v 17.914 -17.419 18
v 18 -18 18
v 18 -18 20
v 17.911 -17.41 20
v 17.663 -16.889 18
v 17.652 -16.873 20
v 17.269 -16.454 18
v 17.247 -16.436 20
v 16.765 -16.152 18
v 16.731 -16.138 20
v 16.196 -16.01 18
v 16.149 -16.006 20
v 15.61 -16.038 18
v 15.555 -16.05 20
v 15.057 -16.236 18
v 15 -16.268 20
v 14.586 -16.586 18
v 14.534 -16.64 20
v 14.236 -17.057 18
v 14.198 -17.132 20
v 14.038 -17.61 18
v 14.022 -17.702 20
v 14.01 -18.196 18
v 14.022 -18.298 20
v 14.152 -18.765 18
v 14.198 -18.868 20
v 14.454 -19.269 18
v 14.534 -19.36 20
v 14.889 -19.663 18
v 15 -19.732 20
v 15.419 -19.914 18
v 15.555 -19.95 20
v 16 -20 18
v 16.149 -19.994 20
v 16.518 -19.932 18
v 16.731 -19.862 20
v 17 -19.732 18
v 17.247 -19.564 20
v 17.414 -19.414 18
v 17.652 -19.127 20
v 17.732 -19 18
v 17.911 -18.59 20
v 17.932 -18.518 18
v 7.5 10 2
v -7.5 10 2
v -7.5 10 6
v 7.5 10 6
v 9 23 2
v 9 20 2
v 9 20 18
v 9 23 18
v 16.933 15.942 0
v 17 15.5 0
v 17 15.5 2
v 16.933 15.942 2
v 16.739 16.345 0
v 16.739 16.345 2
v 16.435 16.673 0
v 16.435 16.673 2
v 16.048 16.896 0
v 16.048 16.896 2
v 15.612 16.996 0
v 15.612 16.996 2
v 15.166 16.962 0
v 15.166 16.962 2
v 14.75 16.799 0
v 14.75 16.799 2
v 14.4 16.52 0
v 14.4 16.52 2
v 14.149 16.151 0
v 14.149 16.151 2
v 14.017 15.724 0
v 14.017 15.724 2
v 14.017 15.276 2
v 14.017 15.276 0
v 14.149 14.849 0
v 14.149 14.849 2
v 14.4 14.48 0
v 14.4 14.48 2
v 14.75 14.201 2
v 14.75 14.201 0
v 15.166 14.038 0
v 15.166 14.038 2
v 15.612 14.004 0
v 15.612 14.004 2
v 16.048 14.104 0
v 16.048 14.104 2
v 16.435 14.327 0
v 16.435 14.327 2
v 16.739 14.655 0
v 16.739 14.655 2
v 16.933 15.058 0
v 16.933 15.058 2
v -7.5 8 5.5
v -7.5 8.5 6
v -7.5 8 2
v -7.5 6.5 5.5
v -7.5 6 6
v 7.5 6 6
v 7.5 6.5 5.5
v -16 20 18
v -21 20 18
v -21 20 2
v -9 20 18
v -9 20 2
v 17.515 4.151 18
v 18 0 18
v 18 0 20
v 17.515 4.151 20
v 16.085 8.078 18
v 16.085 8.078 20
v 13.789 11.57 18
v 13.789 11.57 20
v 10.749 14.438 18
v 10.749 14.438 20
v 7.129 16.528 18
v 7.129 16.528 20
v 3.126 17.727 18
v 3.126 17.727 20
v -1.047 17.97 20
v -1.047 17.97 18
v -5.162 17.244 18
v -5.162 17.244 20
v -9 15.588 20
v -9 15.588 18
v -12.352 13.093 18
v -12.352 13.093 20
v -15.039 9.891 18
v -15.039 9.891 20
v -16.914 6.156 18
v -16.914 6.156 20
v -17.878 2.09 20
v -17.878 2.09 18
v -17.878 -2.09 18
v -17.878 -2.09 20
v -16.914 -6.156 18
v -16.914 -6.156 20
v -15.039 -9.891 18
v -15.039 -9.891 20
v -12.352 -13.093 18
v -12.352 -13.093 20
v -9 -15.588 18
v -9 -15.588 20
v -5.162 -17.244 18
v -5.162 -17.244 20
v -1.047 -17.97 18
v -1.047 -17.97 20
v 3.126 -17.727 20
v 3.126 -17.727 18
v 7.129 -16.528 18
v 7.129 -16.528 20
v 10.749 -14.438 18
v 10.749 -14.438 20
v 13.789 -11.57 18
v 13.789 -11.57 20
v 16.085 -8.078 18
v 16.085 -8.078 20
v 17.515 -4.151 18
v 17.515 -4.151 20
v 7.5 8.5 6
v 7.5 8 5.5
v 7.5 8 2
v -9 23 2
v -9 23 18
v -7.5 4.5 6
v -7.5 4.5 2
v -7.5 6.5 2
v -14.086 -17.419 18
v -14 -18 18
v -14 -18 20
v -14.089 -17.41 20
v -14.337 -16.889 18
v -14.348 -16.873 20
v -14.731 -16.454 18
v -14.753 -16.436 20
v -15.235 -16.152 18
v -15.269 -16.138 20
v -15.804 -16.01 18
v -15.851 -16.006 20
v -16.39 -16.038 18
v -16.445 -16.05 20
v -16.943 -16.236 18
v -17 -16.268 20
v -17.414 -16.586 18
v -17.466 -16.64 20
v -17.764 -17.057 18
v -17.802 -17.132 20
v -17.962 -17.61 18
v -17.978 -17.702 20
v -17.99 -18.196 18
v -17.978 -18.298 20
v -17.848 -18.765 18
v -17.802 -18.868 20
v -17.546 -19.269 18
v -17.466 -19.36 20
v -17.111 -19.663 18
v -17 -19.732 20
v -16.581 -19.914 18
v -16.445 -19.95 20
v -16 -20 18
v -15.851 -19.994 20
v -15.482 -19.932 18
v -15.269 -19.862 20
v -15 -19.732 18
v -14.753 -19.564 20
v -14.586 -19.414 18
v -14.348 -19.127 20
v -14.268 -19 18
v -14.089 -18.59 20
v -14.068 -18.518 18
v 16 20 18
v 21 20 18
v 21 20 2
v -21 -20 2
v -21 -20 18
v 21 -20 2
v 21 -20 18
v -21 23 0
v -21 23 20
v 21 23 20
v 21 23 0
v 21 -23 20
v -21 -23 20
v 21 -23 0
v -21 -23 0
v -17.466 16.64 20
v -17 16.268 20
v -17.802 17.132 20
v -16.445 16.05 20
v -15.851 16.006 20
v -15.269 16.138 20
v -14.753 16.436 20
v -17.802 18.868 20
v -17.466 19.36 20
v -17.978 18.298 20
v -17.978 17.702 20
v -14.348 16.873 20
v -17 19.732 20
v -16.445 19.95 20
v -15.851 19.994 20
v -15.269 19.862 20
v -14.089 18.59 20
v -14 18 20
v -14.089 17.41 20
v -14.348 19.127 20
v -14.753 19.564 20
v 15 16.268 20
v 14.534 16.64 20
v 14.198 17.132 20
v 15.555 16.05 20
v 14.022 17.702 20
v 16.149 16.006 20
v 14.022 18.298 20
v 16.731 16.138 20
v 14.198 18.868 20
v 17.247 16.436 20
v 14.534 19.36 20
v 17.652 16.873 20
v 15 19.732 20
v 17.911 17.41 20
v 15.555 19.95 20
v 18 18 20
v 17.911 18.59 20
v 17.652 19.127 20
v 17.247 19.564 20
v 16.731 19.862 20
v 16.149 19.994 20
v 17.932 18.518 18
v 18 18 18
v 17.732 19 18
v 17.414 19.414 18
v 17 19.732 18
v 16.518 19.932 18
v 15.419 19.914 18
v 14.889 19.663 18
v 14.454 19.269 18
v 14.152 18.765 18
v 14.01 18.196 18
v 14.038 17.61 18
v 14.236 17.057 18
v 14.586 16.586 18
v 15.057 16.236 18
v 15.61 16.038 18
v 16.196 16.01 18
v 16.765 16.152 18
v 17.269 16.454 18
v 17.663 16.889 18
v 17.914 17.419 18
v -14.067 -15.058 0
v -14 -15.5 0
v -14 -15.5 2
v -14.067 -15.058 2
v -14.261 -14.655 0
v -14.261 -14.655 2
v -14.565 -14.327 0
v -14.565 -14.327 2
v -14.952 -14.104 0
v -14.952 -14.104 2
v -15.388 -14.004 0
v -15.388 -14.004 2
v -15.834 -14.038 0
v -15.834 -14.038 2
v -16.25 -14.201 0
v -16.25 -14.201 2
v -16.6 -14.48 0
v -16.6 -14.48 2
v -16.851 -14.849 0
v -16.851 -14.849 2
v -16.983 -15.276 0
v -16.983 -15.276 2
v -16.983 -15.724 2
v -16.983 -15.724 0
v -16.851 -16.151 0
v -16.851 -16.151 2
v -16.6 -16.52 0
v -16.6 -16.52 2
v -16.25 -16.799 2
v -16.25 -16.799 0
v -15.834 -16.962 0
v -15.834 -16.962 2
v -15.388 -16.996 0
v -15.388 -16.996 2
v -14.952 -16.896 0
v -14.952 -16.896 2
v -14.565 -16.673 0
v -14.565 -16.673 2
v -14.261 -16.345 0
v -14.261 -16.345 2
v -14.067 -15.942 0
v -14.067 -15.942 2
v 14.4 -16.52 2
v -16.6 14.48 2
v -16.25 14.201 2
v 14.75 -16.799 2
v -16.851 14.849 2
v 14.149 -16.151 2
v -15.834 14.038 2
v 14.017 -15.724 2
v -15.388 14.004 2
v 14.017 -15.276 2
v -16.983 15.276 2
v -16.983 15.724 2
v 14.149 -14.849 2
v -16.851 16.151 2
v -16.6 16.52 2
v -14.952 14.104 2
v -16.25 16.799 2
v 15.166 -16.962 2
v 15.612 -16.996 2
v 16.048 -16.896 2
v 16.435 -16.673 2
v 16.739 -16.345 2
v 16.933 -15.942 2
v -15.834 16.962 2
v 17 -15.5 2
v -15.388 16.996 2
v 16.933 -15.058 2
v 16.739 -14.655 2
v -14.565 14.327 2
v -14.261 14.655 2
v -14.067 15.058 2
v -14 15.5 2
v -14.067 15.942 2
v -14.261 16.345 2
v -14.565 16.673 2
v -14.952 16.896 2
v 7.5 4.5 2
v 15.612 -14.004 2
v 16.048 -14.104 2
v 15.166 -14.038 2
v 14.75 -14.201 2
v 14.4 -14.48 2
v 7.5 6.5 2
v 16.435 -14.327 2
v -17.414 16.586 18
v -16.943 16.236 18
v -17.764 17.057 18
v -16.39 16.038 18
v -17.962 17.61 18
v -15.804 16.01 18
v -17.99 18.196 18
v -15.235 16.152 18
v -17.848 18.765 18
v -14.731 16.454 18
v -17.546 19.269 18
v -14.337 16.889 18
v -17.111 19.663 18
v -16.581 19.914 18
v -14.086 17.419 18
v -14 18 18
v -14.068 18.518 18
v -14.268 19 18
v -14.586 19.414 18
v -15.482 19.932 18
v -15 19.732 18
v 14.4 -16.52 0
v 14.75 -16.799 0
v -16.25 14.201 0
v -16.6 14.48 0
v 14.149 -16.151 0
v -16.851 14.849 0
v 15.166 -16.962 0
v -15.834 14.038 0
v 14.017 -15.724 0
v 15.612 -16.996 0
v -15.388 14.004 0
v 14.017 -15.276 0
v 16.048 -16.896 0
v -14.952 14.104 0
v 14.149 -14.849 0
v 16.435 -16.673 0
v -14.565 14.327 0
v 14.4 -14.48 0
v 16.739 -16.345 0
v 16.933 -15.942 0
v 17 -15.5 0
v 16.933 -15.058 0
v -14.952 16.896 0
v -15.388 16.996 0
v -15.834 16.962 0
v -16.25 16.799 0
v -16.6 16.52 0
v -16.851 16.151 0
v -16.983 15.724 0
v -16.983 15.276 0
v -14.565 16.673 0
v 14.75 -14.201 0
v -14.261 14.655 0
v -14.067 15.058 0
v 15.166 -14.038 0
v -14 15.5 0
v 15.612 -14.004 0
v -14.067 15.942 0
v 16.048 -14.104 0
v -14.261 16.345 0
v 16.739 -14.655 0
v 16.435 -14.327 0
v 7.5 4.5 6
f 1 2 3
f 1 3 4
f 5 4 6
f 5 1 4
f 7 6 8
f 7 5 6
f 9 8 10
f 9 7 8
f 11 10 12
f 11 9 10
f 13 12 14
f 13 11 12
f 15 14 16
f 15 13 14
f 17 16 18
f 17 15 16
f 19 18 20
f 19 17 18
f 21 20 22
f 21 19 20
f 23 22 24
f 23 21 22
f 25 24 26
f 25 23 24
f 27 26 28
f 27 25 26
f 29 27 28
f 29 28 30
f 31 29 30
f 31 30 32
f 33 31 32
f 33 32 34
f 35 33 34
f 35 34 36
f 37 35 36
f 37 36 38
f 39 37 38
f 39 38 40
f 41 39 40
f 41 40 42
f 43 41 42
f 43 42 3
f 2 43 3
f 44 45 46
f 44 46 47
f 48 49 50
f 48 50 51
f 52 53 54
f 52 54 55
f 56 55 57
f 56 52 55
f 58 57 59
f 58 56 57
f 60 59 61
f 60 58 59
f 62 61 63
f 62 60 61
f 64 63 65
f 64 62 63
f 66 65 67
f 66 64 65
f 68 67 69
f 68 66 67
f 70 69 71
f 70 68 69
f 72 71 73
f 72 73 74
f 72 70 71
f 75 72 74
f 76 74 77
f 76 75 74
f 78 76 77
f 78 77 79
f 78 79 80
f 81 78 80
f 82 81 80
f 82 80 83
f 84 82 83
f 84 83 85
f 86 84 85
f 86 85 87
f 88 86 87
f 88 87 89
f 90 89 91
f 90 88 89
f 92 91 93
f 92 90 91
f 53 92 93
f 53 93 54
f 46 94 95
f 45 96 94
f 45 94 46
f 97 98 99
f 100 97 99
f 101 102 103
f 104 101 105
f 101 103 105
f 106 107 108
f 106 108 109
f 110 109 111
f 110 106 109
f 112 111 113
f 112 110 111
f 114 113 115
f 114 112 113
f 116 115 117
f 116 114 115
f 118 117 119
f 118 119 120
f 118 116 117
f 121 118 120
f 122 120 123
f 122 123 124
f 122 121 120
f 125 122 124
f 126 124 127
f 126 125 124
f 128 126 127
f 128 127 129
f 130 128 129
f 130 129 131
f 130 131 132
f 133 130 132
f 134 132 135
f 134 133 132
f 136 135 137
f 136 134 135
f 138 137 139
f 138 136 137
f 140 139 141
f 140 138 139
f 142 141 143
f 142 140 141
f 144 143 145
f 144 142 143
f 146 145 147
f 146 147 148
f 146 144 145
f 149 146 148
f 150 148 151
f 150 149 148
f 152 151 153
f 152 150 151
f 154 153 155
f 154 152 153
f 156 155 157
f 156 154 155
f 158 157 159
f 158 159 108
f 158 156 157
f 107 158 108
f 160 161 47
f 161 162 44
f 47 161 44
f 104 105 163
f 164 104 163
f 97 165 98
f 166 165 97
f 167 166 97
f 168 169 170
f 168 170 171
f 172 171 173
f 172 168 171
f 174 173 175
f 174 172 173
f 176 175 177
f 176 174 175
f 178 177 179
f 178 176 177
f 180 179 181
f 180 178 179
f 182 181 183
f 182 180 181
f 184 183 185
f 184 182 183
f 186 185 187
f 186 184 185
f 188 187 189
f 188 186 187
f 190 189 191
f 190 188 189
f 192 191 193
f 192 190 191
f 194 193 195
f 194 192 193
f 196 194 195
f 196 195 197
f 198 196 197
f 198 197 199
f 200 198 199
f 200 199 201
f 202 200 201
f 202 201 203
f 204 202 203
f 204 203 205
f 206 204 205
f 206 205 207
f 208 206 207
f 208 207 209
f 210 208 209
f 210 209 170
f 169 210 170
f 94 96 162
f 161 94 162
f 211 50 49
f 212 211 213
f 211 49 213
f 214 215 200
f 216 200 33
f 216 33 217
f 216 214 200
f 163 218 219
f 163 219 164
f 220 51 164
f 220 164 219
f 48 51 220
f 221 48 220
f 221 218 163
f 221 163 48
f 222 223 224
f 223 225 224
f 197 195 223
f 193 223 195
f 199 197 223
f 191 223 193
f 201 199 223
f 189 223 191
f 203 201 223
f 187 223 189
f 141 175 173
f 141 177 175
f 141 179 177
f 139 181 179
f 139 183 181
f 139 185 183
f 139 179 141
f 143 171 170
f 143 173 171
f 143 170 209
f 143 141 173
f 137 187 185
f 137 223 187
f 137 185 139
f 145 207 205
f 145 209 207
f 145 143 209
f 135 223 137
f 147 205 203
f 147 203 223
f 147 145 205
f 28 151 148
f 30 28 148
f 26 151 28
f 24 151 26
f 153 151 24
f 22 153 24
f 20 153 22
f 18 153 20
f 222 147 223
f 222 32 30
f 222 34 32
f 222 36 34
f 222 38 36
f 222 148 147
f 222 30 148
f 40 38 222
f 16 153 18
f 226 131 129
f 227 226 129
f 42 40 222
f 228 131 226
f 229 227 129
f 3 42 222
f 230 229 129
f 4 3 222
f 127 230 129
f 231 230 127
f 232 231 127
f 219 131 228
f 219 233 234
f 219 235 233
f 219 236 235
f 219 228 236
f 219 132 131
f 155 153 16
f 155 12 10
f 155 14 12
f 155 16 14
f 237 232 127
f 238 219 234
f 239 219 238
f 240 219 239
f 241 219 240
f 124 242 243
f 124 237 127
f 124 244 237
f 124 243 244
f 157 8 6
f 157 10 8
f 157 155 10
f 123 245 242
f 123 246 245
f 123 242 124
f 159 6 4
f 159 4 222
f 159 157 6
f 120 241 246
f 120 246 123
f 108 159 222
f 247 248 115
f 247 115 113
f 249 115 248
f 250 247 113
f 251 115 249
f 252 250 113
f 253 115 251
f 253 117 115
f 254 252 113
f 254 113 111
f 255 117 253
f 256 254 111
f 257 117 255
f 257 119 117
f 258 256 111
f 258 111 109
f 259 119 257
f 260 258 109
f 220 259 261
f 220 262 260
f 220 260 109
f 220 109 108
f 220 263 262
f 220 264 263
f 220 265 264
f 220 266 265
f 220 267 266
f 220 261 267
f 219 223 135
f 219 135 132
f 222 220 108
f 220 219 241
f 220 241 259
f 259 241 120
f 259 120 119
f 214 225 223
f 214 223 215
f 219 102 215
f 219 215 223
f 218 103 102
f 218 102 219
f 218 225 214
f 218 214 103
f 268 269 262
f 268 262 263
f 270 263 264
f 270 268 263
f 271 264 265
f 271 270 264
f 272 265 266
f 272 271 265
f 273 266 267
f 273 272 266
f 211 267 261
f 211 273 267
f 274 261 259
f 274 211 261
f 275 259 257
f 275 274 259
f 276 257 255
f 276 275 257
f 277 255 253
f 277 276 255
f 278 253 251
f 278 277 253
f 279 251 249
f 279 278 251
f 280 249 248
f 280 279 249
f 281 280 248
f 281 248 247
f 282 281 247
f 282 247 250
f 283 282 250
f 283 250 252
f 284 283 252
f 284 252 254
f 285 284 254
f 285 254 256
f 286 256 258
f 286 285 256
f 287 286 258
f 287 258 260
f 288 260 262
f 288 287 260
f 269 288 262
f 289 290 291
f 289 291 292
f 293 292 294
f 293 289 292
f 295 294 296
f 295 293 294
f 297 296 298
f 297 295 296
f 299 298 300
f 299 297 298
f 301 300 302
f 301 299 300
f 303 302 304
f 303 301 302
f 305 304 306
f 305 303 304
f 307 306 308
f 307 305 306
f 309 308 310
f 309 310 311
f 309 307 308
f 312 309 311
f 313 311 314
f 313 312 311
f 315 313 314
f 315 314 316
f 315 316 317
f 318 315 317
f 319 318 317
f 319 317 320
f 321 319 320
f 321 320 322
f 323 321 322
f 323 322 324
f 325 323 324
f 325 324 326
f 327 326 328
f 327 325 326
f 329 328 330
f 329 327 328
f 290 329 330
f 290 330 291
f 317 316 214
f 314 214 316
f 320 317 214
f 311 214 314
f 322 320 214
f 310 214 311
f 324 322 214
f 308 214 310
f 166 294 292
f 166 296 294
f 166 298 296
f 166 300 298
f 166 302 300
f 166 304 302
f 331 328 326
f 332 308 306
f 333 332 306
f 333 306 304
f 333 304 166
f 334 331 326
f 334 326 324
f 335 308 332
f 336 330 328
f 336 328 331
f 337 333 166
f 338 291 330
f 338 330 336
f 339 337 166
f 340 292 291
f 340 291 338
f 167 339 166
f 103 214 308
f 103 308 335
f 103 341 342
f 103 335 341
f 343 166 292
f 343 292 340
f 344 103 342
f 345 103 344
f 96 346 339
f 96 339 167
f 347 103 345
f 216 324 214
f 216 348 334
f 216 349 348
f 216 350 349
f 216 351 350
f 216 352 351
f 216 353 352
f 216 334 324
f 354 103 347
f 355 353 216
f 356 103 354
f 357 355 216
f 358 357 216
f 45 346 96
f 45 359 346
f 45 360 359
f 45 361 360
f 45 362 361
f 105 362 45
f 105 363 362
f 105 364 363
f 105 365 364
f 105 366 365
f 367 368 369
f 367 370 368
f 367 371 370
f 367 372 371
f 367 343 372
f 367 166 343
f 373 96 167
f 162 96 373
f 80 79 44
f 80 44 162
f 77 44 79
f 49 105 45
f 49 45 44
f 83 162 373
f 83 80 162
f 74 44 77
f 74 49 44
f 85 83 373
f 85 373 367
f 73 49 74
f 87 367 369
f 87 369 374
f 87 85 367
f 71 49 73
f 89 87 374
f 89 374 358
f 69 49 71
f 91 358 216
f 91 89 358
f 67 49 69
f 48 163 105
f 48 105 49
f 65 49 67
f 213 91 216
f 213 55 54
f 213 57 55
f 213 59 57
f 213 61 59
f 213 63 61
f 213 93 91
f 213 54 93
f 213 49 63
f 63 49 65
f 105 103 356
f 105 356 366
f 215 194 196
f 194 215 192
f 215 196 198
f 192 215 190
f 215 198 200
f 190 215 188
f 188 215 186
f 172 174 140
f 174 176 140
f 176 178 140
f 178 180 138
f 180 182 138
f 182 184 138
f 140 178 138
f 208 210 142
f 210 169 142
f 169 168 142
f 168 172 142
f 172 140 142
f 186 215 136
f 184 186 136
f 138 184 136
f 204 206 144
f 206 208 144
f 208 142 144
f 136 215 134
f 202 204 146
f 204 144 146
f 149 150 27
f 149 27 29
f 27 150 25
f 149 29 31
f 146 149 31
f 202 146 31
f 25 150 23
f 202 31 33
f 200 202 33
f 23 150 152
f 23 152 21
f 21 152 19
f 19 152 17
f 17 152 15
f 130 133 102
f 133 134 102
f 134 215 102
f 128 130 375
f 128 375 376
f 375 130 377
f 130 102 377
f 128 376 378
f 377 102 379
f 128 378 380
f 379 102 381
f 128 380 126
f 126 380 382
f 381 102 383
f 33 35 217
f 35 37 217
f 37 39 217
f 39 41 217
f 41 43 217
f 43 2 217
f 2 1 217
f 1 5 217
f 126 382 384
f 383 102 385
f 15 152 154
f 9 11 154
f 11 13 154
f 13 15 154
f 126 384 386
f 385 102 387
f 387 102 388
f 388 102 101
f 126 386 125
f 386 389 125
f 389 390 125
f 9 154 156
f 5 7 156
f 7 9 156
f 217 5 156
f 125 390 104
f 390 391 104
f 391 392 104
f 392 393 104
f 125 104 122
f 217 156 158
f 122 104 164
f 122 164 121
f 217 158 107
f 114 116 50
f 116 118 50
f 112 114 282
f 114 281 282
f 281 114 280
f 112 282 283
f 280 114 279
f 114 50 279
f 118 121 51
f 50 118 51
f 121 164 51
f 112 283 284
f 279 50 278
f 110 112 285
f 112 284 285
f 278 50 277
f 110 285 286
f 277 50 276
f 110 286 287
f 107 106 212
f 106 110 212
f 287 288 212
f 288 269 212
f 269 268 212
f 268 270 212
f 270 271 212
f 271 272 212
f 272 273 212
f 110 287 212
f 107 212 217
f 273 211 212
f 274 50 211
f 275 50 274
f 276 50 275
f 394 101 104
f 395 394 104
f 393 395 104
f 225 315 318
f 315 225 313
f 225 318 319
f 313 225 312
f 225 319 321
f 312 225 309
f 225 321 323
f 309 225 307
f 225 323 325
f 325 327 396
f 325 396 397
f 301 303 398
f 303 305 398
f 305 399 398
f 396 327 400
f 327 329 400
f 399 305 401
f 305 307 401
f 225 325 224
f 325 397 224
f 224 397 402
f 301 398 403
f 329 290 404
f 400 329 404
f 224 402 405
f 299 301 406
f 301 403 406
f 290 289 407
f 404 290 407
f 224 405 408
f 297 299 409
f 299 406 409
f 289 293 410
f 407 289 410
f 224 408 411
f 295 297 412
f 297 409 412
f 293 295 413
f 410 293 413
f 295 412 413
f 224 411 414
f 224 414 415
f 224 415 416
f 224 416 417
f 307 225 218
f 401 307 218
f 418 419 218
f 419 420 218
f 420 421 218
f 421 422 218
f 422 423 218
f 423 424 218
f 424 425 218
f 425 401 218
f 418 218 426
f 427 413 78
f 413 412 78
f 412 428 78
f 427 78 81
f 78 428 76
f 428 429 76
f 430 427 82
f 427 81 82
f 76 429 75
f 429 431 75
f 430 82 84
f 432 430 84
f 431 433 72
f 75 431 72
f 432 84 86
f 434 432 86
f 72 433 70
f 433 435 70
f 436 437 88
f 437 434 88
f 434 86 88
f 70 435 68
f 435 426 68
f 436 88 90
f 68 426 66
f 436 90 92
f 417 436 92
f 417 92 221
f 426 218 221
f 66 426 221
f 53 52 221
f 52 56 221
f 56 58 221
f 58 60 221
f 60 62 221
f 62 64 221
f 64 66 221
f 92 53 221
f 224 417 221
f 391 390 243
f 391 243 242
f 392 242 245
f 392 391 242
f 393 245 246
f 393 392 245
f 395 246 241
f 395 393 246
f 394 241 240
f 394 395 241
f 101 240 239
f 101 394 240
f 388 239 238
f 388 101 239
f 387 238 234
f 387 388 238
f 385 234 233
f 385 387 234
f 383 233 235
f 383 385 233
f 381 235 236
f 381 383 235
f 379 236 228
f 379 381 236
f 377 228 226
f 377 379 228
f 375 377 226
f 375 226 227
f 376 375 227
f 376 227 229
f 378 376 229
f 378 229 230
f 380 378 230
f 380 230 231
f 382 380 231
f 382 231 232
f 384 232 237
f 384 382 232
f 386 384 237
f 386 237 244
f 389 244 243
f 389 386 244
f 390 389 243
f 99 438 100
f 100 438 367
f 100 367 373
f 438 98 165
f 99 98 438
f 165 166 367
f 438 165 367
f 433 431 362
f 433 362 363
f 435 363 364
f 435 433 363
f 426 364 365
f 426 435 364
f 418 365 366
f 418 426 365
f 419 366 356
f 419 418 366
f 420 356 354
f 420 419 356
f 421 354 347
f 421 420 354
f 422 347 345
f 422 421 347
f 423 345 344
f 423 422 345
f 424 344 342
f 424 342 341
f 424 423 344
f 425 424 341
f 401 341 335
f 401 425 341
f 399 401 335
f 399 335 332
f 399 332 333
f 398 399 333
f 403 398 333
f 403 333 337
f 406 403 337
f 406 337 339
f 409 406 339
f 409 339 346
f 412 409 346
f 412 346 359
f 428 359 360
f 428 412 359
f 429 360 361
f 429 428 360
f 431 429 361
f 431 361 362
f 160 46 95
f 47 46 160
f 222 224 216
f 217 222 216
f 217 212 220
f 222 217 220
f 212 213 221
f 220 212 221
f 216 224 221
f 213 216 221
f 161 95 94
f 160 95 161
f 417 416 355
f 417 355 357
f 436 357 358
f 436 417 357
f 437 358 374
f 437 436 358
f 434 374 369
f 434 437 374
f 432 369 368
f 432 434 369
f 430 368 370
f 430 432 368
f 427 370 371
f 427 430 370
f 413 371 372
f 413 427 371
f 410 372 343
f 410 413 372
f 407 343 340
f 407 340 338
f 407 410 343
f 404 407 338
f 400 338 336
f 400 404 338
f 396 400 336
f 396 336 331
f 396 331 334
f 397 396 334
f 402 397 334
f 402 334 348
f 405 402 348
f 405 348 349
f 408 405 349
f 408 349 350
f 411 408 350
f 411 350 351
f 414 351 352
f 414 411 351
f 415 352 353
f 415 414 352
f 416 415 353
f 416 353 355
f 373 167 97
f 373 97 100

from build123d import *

# Parameters (mm, degrees)
F0_W     = 42
F0_H     = 46
F0_R     = 1.5
F1_DEPTH = 2
F2_W     = 12
F2_H     = 3
F2_W_2   = 42
F3_DEPTH = 16
F4_W     = 42
F4_H     = 46
F4_R     = 2
F4_R_2   = 18
F5_DEPTH = 2
F6_W     = 15
F6_H     = 2
F7_DEPTH = 4
F8_SIZE  = 0.5


with BuildPart() as f1:
    # F0 (on Top) → F1 (new body)
    with BuildSketch(Plane.XY):
        Rectangle(F0_W, F0_H)
        with Locations((-15.5, -15.5)):
            Circle(F0_R, mode=Mode.SUBTRACT)
        with Locations((15.5, -15.5)):
            Circle(F0_R, mode=Mode.SUBTRACT)
        with Locations((-15.5, 15.5)):
            Circle(F0_R, mode=Mode.SUBTRACT)
        with Locations((15.5, 15.5)):
            Circle(F0_R, mode=Mode.SUBTRACT)
    extrude(amount=F1_DEPTH)

    # F2 (on face) → F3 (join)
    with BuildSketch(Plane.XY.offset(2)):
        with Locations((15, 21.5)):
            Rectangle(F2_W, F2_H)
        with Locations((-15, 21.5)):
            Rectangle(F2_W, F2_H)
        with Locations((0, -21.5)):
            Rectangle(F2_W_2, F2_H)
    extrude(amount=F3_DEPTH)

    # F4 (on face) → F5 (join)
    with BuildSketch(Plane.XY.offset(18)):
        Rectangle(F4_W, F4_H)
        with Locations((-16, -18)):
            Circle(F4_R, mode=Mode.SUBTRACT)
        with Locations((16, -18)):
            Circle(F4_R, mode=Mode.SUBTRACT)
        with Locations((-16, 18)):
            Circle(F4_R, mode=Mode.SUBTRACT)
        Circle(F4_R_2, mode=Mode.SUBTRACT)
        with Locations((16, 18)):
            Circle(F4_R, mode=Mode.SUBTRACT)
    extrude(amount=F5_DEPTH)

    # F6 (on face) → F7 (join)
    with BuildSketch(Plane.XY.offset(2)):
        with Locations((0, 9)):
            Rectangle(F6_W, F6_H)
        with Locations((0, 5.5)):
            Rectangle(F6_W, F6_H)
    extrude(amount=F7_DEPTH)

    # F8
    f8_edges = [f1.edges().sort_by_distance(p)[0] for p in [
        (0, 8, 6),
        (0, 6.5, 6),
    ]]
    chamfer(f8_edges, length=F8_SIZE)


solid = f1.part
